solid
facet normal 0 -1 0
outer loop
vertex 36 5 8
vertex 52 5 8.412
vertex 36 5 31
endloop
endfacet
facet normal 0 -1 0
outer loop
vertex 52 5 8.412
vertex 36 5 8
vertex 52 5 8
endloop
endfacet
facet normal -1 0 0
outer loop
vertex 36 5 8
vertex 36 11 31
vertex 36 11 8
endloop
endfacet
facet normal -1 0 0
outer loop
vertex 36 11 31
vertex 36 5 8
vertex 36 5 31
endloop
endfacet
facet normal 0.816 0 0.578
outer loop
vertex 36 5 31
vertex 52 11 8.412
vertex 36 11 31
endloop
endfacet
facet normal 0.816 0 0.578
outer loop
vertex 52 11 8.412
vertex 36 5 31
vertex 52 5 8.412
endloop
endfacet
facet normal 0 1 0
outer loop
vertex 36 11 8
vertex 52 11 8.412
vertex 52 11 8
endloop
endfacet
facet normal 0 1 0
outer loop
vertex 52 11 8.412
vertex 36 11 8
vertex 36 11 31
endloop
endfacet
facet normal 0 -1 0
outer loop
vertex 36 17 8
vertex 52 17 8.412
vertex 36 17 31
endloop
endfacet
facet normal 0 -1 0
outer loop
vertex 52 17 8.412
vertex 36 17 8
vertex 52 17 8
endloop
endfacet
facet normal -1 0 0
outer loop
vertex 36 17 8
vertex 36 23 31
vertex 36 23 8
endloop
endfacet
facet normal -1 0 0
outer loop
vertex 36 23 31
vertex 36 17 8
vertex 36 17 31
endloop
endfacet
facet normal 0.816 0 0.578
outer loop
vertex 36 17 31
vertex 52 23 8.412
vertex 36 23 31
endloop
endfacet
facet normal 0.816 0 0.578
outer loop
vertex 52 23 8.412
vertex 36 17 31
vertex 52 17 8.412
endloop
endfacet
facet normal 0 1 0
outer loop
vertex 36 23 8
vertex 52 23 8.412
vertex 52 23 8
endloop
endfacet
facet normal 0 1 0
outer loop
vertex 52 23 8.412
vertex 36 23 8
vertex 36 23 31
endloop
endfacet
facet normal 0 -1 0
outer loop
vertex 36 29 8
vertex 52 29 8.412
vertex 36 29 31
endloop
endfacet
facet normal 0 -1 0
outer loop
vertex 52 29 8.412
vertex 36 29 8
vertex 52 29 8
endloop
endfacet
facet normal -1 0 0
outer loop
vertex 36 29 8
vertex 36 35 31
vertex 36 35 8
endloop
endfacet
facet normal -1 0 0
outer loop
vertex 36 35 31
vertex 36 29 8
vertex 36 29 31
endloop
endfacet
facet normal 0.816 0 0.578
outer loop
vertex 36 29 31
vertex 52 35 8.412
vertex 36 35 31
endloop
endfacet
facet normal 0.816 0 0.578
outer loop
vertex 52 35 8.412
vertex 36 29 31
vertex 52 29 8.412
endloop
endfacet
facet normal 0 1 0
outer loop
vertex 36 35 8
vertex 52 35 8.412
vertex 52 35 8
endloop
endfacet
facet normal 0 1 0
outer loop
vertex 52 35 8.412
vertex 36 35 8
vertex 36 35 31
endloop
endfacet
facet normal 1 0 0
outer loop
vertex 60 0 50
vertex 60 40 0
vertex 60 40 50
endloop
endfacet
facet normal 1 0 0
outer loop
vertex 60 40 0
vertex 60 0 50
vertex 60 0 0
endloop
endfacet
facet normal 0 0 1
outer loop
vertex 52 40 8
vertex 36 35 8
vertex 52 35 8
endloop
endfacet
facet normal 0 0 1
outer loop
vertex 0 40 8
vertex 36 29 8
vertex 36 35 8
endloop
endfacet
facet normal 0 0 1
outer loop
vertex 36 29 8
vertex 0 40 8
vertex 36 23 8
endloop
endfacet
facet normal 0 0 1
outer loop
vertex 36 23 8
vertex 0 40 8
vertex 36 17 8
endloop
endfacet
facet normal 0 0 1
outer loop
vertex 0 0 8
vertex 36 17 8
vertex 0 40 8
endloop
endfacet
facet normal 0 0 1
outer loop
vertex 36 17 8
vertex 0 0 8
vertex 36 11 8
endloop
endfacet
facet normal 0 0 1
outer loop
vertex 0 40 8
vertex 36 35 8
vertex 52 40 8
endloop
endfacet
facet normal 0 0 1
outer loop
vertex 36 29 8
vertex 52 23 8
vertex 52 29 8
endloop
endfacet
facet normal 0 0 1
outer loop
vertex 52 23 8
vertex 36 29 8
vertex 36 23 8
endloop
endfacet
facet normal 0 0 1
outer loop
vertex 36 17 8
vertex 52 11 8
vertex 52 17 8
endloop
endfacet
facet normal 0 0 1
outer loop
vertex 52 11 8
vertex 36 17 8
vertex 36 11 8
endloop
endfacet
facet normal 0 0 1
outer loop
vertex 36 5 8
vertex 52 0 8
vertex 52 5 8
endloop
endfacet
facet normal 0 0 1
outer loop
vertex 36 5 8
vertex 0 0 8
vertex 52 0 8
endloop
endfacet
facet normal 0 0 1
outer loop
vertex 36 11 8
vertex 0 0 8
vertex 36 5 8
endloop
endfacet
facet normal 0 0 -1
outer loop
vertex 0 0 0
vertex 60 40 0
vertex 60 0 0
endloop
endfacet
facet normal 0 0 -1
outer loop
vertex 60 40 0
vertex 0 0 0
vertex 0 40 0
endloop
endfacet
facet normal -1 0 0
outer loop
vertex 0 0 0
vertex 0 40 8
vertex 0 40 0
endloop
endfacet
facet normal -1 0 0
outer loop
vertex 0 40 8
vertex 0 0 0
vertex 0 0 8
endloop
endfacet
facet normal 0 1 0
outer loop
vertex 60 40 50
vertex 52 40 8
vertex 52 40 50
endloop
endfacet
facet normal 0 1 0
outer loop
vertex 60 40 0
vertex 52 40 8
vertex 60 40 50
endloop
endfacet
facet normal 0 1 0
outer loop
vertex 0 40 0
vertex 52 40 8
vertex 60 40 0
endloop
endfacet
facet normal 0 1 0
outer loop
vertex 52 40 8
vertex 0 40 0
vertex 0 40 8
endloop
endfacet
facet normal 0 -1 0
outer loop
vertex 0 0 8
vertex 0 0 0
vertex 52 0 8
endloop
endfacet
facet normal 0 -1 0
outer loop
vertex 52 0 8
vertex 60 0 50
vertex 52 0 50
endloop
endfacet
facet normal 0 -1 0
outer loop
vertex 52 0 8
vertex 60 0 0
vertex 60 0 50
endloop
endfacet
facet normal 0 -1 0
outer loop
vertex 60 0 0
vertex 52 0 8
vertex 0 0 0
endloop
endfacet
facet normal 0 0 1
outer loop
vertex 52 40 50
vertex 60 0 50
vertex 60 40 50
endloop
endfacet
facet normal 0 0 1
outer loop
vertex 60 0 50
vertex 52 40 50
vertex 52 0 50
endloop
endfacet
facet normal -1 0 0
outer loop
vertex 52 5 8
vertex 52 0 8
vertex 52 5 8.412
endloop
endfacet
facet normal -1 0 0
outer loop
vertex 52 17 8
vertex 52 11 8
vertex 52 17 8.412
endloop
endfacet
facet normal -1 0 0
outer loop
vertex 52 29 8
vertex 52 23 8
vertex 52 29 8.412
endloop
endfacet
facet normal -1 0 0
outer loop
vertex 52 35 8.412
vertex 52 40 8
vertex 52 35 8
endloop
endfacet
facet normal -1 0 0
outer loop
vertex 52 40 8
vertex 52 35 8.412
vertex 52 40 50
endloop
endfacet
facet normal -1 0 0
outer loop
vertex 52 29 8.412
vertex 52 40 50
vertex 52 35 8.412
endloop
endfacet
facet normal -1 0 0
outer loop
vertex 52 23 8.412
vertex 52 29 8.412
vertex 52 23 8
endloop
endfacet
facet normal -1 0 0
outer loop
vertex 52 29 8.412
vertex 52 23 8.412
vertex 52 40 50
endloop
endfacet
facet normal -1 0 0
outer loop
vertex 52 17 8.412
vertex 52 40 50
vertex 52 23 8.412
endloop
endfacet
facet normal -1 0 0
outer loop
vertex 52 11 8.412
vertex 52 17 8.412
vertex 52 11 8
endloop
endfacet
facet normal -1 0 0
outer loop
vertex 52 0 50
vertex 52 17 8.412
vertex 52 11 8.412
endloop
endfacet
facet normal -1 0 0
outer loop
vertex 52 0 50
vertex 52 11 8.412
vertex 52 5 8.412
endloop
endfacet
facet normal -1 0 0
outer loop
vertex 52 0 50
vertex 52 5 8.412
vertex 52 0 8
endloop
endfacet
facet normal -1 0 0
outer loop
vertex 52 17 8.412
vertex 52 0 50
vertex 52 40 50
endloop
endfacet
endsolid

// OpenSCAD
$fn = 32;

// ----------------------------------------------------------------------
// Rib bracket: 3-gusset L bracket
// ----------------------------------------------------------------------

// --- parameters (mm) ---
base_l = 60;              // foot length, X
base_w = 40;              // foot width, Y
base_t = 8;               // foot thickness
plate_t = 8;              // upright plate thickness
plate_h = 50;             // overall height
gus_l = 16;               // gusset leg along the foot
gus_h = 24;               // gusset height
gus_t = 6;                // gusset thickness
gus_edge = 5;             // gusset margin from the foot edge
n_gus = 3;                // gusset count
fit_tol = 0.1;            // tolerance for press fits, mm
free_tol = 0.5;           // tolerance for clearance fits, mm

gus_pitch = (base_w - 2 * gus_edge - gus_t) / (n_gus - 1);  // gusset pitch

union() {
  cube([base_l, base_w, base_t]);
  translate([base_l - plate_t, 0, base_t - 1])
    cube([plate_t, base_w, plate_h - base_t + 1]);
  for (i = [0 : n_gus - 1])
    translate([base_l - plate_t - gus_l, gus_edge + i * gus_pitch, base_t - 1])
      rotate([-90, 0, 0])
        linear_extrude(height = gus_t)
          polygon(points = [[0, 0], [gus_l + 1, 0], [0, -gus_h]]);
}
